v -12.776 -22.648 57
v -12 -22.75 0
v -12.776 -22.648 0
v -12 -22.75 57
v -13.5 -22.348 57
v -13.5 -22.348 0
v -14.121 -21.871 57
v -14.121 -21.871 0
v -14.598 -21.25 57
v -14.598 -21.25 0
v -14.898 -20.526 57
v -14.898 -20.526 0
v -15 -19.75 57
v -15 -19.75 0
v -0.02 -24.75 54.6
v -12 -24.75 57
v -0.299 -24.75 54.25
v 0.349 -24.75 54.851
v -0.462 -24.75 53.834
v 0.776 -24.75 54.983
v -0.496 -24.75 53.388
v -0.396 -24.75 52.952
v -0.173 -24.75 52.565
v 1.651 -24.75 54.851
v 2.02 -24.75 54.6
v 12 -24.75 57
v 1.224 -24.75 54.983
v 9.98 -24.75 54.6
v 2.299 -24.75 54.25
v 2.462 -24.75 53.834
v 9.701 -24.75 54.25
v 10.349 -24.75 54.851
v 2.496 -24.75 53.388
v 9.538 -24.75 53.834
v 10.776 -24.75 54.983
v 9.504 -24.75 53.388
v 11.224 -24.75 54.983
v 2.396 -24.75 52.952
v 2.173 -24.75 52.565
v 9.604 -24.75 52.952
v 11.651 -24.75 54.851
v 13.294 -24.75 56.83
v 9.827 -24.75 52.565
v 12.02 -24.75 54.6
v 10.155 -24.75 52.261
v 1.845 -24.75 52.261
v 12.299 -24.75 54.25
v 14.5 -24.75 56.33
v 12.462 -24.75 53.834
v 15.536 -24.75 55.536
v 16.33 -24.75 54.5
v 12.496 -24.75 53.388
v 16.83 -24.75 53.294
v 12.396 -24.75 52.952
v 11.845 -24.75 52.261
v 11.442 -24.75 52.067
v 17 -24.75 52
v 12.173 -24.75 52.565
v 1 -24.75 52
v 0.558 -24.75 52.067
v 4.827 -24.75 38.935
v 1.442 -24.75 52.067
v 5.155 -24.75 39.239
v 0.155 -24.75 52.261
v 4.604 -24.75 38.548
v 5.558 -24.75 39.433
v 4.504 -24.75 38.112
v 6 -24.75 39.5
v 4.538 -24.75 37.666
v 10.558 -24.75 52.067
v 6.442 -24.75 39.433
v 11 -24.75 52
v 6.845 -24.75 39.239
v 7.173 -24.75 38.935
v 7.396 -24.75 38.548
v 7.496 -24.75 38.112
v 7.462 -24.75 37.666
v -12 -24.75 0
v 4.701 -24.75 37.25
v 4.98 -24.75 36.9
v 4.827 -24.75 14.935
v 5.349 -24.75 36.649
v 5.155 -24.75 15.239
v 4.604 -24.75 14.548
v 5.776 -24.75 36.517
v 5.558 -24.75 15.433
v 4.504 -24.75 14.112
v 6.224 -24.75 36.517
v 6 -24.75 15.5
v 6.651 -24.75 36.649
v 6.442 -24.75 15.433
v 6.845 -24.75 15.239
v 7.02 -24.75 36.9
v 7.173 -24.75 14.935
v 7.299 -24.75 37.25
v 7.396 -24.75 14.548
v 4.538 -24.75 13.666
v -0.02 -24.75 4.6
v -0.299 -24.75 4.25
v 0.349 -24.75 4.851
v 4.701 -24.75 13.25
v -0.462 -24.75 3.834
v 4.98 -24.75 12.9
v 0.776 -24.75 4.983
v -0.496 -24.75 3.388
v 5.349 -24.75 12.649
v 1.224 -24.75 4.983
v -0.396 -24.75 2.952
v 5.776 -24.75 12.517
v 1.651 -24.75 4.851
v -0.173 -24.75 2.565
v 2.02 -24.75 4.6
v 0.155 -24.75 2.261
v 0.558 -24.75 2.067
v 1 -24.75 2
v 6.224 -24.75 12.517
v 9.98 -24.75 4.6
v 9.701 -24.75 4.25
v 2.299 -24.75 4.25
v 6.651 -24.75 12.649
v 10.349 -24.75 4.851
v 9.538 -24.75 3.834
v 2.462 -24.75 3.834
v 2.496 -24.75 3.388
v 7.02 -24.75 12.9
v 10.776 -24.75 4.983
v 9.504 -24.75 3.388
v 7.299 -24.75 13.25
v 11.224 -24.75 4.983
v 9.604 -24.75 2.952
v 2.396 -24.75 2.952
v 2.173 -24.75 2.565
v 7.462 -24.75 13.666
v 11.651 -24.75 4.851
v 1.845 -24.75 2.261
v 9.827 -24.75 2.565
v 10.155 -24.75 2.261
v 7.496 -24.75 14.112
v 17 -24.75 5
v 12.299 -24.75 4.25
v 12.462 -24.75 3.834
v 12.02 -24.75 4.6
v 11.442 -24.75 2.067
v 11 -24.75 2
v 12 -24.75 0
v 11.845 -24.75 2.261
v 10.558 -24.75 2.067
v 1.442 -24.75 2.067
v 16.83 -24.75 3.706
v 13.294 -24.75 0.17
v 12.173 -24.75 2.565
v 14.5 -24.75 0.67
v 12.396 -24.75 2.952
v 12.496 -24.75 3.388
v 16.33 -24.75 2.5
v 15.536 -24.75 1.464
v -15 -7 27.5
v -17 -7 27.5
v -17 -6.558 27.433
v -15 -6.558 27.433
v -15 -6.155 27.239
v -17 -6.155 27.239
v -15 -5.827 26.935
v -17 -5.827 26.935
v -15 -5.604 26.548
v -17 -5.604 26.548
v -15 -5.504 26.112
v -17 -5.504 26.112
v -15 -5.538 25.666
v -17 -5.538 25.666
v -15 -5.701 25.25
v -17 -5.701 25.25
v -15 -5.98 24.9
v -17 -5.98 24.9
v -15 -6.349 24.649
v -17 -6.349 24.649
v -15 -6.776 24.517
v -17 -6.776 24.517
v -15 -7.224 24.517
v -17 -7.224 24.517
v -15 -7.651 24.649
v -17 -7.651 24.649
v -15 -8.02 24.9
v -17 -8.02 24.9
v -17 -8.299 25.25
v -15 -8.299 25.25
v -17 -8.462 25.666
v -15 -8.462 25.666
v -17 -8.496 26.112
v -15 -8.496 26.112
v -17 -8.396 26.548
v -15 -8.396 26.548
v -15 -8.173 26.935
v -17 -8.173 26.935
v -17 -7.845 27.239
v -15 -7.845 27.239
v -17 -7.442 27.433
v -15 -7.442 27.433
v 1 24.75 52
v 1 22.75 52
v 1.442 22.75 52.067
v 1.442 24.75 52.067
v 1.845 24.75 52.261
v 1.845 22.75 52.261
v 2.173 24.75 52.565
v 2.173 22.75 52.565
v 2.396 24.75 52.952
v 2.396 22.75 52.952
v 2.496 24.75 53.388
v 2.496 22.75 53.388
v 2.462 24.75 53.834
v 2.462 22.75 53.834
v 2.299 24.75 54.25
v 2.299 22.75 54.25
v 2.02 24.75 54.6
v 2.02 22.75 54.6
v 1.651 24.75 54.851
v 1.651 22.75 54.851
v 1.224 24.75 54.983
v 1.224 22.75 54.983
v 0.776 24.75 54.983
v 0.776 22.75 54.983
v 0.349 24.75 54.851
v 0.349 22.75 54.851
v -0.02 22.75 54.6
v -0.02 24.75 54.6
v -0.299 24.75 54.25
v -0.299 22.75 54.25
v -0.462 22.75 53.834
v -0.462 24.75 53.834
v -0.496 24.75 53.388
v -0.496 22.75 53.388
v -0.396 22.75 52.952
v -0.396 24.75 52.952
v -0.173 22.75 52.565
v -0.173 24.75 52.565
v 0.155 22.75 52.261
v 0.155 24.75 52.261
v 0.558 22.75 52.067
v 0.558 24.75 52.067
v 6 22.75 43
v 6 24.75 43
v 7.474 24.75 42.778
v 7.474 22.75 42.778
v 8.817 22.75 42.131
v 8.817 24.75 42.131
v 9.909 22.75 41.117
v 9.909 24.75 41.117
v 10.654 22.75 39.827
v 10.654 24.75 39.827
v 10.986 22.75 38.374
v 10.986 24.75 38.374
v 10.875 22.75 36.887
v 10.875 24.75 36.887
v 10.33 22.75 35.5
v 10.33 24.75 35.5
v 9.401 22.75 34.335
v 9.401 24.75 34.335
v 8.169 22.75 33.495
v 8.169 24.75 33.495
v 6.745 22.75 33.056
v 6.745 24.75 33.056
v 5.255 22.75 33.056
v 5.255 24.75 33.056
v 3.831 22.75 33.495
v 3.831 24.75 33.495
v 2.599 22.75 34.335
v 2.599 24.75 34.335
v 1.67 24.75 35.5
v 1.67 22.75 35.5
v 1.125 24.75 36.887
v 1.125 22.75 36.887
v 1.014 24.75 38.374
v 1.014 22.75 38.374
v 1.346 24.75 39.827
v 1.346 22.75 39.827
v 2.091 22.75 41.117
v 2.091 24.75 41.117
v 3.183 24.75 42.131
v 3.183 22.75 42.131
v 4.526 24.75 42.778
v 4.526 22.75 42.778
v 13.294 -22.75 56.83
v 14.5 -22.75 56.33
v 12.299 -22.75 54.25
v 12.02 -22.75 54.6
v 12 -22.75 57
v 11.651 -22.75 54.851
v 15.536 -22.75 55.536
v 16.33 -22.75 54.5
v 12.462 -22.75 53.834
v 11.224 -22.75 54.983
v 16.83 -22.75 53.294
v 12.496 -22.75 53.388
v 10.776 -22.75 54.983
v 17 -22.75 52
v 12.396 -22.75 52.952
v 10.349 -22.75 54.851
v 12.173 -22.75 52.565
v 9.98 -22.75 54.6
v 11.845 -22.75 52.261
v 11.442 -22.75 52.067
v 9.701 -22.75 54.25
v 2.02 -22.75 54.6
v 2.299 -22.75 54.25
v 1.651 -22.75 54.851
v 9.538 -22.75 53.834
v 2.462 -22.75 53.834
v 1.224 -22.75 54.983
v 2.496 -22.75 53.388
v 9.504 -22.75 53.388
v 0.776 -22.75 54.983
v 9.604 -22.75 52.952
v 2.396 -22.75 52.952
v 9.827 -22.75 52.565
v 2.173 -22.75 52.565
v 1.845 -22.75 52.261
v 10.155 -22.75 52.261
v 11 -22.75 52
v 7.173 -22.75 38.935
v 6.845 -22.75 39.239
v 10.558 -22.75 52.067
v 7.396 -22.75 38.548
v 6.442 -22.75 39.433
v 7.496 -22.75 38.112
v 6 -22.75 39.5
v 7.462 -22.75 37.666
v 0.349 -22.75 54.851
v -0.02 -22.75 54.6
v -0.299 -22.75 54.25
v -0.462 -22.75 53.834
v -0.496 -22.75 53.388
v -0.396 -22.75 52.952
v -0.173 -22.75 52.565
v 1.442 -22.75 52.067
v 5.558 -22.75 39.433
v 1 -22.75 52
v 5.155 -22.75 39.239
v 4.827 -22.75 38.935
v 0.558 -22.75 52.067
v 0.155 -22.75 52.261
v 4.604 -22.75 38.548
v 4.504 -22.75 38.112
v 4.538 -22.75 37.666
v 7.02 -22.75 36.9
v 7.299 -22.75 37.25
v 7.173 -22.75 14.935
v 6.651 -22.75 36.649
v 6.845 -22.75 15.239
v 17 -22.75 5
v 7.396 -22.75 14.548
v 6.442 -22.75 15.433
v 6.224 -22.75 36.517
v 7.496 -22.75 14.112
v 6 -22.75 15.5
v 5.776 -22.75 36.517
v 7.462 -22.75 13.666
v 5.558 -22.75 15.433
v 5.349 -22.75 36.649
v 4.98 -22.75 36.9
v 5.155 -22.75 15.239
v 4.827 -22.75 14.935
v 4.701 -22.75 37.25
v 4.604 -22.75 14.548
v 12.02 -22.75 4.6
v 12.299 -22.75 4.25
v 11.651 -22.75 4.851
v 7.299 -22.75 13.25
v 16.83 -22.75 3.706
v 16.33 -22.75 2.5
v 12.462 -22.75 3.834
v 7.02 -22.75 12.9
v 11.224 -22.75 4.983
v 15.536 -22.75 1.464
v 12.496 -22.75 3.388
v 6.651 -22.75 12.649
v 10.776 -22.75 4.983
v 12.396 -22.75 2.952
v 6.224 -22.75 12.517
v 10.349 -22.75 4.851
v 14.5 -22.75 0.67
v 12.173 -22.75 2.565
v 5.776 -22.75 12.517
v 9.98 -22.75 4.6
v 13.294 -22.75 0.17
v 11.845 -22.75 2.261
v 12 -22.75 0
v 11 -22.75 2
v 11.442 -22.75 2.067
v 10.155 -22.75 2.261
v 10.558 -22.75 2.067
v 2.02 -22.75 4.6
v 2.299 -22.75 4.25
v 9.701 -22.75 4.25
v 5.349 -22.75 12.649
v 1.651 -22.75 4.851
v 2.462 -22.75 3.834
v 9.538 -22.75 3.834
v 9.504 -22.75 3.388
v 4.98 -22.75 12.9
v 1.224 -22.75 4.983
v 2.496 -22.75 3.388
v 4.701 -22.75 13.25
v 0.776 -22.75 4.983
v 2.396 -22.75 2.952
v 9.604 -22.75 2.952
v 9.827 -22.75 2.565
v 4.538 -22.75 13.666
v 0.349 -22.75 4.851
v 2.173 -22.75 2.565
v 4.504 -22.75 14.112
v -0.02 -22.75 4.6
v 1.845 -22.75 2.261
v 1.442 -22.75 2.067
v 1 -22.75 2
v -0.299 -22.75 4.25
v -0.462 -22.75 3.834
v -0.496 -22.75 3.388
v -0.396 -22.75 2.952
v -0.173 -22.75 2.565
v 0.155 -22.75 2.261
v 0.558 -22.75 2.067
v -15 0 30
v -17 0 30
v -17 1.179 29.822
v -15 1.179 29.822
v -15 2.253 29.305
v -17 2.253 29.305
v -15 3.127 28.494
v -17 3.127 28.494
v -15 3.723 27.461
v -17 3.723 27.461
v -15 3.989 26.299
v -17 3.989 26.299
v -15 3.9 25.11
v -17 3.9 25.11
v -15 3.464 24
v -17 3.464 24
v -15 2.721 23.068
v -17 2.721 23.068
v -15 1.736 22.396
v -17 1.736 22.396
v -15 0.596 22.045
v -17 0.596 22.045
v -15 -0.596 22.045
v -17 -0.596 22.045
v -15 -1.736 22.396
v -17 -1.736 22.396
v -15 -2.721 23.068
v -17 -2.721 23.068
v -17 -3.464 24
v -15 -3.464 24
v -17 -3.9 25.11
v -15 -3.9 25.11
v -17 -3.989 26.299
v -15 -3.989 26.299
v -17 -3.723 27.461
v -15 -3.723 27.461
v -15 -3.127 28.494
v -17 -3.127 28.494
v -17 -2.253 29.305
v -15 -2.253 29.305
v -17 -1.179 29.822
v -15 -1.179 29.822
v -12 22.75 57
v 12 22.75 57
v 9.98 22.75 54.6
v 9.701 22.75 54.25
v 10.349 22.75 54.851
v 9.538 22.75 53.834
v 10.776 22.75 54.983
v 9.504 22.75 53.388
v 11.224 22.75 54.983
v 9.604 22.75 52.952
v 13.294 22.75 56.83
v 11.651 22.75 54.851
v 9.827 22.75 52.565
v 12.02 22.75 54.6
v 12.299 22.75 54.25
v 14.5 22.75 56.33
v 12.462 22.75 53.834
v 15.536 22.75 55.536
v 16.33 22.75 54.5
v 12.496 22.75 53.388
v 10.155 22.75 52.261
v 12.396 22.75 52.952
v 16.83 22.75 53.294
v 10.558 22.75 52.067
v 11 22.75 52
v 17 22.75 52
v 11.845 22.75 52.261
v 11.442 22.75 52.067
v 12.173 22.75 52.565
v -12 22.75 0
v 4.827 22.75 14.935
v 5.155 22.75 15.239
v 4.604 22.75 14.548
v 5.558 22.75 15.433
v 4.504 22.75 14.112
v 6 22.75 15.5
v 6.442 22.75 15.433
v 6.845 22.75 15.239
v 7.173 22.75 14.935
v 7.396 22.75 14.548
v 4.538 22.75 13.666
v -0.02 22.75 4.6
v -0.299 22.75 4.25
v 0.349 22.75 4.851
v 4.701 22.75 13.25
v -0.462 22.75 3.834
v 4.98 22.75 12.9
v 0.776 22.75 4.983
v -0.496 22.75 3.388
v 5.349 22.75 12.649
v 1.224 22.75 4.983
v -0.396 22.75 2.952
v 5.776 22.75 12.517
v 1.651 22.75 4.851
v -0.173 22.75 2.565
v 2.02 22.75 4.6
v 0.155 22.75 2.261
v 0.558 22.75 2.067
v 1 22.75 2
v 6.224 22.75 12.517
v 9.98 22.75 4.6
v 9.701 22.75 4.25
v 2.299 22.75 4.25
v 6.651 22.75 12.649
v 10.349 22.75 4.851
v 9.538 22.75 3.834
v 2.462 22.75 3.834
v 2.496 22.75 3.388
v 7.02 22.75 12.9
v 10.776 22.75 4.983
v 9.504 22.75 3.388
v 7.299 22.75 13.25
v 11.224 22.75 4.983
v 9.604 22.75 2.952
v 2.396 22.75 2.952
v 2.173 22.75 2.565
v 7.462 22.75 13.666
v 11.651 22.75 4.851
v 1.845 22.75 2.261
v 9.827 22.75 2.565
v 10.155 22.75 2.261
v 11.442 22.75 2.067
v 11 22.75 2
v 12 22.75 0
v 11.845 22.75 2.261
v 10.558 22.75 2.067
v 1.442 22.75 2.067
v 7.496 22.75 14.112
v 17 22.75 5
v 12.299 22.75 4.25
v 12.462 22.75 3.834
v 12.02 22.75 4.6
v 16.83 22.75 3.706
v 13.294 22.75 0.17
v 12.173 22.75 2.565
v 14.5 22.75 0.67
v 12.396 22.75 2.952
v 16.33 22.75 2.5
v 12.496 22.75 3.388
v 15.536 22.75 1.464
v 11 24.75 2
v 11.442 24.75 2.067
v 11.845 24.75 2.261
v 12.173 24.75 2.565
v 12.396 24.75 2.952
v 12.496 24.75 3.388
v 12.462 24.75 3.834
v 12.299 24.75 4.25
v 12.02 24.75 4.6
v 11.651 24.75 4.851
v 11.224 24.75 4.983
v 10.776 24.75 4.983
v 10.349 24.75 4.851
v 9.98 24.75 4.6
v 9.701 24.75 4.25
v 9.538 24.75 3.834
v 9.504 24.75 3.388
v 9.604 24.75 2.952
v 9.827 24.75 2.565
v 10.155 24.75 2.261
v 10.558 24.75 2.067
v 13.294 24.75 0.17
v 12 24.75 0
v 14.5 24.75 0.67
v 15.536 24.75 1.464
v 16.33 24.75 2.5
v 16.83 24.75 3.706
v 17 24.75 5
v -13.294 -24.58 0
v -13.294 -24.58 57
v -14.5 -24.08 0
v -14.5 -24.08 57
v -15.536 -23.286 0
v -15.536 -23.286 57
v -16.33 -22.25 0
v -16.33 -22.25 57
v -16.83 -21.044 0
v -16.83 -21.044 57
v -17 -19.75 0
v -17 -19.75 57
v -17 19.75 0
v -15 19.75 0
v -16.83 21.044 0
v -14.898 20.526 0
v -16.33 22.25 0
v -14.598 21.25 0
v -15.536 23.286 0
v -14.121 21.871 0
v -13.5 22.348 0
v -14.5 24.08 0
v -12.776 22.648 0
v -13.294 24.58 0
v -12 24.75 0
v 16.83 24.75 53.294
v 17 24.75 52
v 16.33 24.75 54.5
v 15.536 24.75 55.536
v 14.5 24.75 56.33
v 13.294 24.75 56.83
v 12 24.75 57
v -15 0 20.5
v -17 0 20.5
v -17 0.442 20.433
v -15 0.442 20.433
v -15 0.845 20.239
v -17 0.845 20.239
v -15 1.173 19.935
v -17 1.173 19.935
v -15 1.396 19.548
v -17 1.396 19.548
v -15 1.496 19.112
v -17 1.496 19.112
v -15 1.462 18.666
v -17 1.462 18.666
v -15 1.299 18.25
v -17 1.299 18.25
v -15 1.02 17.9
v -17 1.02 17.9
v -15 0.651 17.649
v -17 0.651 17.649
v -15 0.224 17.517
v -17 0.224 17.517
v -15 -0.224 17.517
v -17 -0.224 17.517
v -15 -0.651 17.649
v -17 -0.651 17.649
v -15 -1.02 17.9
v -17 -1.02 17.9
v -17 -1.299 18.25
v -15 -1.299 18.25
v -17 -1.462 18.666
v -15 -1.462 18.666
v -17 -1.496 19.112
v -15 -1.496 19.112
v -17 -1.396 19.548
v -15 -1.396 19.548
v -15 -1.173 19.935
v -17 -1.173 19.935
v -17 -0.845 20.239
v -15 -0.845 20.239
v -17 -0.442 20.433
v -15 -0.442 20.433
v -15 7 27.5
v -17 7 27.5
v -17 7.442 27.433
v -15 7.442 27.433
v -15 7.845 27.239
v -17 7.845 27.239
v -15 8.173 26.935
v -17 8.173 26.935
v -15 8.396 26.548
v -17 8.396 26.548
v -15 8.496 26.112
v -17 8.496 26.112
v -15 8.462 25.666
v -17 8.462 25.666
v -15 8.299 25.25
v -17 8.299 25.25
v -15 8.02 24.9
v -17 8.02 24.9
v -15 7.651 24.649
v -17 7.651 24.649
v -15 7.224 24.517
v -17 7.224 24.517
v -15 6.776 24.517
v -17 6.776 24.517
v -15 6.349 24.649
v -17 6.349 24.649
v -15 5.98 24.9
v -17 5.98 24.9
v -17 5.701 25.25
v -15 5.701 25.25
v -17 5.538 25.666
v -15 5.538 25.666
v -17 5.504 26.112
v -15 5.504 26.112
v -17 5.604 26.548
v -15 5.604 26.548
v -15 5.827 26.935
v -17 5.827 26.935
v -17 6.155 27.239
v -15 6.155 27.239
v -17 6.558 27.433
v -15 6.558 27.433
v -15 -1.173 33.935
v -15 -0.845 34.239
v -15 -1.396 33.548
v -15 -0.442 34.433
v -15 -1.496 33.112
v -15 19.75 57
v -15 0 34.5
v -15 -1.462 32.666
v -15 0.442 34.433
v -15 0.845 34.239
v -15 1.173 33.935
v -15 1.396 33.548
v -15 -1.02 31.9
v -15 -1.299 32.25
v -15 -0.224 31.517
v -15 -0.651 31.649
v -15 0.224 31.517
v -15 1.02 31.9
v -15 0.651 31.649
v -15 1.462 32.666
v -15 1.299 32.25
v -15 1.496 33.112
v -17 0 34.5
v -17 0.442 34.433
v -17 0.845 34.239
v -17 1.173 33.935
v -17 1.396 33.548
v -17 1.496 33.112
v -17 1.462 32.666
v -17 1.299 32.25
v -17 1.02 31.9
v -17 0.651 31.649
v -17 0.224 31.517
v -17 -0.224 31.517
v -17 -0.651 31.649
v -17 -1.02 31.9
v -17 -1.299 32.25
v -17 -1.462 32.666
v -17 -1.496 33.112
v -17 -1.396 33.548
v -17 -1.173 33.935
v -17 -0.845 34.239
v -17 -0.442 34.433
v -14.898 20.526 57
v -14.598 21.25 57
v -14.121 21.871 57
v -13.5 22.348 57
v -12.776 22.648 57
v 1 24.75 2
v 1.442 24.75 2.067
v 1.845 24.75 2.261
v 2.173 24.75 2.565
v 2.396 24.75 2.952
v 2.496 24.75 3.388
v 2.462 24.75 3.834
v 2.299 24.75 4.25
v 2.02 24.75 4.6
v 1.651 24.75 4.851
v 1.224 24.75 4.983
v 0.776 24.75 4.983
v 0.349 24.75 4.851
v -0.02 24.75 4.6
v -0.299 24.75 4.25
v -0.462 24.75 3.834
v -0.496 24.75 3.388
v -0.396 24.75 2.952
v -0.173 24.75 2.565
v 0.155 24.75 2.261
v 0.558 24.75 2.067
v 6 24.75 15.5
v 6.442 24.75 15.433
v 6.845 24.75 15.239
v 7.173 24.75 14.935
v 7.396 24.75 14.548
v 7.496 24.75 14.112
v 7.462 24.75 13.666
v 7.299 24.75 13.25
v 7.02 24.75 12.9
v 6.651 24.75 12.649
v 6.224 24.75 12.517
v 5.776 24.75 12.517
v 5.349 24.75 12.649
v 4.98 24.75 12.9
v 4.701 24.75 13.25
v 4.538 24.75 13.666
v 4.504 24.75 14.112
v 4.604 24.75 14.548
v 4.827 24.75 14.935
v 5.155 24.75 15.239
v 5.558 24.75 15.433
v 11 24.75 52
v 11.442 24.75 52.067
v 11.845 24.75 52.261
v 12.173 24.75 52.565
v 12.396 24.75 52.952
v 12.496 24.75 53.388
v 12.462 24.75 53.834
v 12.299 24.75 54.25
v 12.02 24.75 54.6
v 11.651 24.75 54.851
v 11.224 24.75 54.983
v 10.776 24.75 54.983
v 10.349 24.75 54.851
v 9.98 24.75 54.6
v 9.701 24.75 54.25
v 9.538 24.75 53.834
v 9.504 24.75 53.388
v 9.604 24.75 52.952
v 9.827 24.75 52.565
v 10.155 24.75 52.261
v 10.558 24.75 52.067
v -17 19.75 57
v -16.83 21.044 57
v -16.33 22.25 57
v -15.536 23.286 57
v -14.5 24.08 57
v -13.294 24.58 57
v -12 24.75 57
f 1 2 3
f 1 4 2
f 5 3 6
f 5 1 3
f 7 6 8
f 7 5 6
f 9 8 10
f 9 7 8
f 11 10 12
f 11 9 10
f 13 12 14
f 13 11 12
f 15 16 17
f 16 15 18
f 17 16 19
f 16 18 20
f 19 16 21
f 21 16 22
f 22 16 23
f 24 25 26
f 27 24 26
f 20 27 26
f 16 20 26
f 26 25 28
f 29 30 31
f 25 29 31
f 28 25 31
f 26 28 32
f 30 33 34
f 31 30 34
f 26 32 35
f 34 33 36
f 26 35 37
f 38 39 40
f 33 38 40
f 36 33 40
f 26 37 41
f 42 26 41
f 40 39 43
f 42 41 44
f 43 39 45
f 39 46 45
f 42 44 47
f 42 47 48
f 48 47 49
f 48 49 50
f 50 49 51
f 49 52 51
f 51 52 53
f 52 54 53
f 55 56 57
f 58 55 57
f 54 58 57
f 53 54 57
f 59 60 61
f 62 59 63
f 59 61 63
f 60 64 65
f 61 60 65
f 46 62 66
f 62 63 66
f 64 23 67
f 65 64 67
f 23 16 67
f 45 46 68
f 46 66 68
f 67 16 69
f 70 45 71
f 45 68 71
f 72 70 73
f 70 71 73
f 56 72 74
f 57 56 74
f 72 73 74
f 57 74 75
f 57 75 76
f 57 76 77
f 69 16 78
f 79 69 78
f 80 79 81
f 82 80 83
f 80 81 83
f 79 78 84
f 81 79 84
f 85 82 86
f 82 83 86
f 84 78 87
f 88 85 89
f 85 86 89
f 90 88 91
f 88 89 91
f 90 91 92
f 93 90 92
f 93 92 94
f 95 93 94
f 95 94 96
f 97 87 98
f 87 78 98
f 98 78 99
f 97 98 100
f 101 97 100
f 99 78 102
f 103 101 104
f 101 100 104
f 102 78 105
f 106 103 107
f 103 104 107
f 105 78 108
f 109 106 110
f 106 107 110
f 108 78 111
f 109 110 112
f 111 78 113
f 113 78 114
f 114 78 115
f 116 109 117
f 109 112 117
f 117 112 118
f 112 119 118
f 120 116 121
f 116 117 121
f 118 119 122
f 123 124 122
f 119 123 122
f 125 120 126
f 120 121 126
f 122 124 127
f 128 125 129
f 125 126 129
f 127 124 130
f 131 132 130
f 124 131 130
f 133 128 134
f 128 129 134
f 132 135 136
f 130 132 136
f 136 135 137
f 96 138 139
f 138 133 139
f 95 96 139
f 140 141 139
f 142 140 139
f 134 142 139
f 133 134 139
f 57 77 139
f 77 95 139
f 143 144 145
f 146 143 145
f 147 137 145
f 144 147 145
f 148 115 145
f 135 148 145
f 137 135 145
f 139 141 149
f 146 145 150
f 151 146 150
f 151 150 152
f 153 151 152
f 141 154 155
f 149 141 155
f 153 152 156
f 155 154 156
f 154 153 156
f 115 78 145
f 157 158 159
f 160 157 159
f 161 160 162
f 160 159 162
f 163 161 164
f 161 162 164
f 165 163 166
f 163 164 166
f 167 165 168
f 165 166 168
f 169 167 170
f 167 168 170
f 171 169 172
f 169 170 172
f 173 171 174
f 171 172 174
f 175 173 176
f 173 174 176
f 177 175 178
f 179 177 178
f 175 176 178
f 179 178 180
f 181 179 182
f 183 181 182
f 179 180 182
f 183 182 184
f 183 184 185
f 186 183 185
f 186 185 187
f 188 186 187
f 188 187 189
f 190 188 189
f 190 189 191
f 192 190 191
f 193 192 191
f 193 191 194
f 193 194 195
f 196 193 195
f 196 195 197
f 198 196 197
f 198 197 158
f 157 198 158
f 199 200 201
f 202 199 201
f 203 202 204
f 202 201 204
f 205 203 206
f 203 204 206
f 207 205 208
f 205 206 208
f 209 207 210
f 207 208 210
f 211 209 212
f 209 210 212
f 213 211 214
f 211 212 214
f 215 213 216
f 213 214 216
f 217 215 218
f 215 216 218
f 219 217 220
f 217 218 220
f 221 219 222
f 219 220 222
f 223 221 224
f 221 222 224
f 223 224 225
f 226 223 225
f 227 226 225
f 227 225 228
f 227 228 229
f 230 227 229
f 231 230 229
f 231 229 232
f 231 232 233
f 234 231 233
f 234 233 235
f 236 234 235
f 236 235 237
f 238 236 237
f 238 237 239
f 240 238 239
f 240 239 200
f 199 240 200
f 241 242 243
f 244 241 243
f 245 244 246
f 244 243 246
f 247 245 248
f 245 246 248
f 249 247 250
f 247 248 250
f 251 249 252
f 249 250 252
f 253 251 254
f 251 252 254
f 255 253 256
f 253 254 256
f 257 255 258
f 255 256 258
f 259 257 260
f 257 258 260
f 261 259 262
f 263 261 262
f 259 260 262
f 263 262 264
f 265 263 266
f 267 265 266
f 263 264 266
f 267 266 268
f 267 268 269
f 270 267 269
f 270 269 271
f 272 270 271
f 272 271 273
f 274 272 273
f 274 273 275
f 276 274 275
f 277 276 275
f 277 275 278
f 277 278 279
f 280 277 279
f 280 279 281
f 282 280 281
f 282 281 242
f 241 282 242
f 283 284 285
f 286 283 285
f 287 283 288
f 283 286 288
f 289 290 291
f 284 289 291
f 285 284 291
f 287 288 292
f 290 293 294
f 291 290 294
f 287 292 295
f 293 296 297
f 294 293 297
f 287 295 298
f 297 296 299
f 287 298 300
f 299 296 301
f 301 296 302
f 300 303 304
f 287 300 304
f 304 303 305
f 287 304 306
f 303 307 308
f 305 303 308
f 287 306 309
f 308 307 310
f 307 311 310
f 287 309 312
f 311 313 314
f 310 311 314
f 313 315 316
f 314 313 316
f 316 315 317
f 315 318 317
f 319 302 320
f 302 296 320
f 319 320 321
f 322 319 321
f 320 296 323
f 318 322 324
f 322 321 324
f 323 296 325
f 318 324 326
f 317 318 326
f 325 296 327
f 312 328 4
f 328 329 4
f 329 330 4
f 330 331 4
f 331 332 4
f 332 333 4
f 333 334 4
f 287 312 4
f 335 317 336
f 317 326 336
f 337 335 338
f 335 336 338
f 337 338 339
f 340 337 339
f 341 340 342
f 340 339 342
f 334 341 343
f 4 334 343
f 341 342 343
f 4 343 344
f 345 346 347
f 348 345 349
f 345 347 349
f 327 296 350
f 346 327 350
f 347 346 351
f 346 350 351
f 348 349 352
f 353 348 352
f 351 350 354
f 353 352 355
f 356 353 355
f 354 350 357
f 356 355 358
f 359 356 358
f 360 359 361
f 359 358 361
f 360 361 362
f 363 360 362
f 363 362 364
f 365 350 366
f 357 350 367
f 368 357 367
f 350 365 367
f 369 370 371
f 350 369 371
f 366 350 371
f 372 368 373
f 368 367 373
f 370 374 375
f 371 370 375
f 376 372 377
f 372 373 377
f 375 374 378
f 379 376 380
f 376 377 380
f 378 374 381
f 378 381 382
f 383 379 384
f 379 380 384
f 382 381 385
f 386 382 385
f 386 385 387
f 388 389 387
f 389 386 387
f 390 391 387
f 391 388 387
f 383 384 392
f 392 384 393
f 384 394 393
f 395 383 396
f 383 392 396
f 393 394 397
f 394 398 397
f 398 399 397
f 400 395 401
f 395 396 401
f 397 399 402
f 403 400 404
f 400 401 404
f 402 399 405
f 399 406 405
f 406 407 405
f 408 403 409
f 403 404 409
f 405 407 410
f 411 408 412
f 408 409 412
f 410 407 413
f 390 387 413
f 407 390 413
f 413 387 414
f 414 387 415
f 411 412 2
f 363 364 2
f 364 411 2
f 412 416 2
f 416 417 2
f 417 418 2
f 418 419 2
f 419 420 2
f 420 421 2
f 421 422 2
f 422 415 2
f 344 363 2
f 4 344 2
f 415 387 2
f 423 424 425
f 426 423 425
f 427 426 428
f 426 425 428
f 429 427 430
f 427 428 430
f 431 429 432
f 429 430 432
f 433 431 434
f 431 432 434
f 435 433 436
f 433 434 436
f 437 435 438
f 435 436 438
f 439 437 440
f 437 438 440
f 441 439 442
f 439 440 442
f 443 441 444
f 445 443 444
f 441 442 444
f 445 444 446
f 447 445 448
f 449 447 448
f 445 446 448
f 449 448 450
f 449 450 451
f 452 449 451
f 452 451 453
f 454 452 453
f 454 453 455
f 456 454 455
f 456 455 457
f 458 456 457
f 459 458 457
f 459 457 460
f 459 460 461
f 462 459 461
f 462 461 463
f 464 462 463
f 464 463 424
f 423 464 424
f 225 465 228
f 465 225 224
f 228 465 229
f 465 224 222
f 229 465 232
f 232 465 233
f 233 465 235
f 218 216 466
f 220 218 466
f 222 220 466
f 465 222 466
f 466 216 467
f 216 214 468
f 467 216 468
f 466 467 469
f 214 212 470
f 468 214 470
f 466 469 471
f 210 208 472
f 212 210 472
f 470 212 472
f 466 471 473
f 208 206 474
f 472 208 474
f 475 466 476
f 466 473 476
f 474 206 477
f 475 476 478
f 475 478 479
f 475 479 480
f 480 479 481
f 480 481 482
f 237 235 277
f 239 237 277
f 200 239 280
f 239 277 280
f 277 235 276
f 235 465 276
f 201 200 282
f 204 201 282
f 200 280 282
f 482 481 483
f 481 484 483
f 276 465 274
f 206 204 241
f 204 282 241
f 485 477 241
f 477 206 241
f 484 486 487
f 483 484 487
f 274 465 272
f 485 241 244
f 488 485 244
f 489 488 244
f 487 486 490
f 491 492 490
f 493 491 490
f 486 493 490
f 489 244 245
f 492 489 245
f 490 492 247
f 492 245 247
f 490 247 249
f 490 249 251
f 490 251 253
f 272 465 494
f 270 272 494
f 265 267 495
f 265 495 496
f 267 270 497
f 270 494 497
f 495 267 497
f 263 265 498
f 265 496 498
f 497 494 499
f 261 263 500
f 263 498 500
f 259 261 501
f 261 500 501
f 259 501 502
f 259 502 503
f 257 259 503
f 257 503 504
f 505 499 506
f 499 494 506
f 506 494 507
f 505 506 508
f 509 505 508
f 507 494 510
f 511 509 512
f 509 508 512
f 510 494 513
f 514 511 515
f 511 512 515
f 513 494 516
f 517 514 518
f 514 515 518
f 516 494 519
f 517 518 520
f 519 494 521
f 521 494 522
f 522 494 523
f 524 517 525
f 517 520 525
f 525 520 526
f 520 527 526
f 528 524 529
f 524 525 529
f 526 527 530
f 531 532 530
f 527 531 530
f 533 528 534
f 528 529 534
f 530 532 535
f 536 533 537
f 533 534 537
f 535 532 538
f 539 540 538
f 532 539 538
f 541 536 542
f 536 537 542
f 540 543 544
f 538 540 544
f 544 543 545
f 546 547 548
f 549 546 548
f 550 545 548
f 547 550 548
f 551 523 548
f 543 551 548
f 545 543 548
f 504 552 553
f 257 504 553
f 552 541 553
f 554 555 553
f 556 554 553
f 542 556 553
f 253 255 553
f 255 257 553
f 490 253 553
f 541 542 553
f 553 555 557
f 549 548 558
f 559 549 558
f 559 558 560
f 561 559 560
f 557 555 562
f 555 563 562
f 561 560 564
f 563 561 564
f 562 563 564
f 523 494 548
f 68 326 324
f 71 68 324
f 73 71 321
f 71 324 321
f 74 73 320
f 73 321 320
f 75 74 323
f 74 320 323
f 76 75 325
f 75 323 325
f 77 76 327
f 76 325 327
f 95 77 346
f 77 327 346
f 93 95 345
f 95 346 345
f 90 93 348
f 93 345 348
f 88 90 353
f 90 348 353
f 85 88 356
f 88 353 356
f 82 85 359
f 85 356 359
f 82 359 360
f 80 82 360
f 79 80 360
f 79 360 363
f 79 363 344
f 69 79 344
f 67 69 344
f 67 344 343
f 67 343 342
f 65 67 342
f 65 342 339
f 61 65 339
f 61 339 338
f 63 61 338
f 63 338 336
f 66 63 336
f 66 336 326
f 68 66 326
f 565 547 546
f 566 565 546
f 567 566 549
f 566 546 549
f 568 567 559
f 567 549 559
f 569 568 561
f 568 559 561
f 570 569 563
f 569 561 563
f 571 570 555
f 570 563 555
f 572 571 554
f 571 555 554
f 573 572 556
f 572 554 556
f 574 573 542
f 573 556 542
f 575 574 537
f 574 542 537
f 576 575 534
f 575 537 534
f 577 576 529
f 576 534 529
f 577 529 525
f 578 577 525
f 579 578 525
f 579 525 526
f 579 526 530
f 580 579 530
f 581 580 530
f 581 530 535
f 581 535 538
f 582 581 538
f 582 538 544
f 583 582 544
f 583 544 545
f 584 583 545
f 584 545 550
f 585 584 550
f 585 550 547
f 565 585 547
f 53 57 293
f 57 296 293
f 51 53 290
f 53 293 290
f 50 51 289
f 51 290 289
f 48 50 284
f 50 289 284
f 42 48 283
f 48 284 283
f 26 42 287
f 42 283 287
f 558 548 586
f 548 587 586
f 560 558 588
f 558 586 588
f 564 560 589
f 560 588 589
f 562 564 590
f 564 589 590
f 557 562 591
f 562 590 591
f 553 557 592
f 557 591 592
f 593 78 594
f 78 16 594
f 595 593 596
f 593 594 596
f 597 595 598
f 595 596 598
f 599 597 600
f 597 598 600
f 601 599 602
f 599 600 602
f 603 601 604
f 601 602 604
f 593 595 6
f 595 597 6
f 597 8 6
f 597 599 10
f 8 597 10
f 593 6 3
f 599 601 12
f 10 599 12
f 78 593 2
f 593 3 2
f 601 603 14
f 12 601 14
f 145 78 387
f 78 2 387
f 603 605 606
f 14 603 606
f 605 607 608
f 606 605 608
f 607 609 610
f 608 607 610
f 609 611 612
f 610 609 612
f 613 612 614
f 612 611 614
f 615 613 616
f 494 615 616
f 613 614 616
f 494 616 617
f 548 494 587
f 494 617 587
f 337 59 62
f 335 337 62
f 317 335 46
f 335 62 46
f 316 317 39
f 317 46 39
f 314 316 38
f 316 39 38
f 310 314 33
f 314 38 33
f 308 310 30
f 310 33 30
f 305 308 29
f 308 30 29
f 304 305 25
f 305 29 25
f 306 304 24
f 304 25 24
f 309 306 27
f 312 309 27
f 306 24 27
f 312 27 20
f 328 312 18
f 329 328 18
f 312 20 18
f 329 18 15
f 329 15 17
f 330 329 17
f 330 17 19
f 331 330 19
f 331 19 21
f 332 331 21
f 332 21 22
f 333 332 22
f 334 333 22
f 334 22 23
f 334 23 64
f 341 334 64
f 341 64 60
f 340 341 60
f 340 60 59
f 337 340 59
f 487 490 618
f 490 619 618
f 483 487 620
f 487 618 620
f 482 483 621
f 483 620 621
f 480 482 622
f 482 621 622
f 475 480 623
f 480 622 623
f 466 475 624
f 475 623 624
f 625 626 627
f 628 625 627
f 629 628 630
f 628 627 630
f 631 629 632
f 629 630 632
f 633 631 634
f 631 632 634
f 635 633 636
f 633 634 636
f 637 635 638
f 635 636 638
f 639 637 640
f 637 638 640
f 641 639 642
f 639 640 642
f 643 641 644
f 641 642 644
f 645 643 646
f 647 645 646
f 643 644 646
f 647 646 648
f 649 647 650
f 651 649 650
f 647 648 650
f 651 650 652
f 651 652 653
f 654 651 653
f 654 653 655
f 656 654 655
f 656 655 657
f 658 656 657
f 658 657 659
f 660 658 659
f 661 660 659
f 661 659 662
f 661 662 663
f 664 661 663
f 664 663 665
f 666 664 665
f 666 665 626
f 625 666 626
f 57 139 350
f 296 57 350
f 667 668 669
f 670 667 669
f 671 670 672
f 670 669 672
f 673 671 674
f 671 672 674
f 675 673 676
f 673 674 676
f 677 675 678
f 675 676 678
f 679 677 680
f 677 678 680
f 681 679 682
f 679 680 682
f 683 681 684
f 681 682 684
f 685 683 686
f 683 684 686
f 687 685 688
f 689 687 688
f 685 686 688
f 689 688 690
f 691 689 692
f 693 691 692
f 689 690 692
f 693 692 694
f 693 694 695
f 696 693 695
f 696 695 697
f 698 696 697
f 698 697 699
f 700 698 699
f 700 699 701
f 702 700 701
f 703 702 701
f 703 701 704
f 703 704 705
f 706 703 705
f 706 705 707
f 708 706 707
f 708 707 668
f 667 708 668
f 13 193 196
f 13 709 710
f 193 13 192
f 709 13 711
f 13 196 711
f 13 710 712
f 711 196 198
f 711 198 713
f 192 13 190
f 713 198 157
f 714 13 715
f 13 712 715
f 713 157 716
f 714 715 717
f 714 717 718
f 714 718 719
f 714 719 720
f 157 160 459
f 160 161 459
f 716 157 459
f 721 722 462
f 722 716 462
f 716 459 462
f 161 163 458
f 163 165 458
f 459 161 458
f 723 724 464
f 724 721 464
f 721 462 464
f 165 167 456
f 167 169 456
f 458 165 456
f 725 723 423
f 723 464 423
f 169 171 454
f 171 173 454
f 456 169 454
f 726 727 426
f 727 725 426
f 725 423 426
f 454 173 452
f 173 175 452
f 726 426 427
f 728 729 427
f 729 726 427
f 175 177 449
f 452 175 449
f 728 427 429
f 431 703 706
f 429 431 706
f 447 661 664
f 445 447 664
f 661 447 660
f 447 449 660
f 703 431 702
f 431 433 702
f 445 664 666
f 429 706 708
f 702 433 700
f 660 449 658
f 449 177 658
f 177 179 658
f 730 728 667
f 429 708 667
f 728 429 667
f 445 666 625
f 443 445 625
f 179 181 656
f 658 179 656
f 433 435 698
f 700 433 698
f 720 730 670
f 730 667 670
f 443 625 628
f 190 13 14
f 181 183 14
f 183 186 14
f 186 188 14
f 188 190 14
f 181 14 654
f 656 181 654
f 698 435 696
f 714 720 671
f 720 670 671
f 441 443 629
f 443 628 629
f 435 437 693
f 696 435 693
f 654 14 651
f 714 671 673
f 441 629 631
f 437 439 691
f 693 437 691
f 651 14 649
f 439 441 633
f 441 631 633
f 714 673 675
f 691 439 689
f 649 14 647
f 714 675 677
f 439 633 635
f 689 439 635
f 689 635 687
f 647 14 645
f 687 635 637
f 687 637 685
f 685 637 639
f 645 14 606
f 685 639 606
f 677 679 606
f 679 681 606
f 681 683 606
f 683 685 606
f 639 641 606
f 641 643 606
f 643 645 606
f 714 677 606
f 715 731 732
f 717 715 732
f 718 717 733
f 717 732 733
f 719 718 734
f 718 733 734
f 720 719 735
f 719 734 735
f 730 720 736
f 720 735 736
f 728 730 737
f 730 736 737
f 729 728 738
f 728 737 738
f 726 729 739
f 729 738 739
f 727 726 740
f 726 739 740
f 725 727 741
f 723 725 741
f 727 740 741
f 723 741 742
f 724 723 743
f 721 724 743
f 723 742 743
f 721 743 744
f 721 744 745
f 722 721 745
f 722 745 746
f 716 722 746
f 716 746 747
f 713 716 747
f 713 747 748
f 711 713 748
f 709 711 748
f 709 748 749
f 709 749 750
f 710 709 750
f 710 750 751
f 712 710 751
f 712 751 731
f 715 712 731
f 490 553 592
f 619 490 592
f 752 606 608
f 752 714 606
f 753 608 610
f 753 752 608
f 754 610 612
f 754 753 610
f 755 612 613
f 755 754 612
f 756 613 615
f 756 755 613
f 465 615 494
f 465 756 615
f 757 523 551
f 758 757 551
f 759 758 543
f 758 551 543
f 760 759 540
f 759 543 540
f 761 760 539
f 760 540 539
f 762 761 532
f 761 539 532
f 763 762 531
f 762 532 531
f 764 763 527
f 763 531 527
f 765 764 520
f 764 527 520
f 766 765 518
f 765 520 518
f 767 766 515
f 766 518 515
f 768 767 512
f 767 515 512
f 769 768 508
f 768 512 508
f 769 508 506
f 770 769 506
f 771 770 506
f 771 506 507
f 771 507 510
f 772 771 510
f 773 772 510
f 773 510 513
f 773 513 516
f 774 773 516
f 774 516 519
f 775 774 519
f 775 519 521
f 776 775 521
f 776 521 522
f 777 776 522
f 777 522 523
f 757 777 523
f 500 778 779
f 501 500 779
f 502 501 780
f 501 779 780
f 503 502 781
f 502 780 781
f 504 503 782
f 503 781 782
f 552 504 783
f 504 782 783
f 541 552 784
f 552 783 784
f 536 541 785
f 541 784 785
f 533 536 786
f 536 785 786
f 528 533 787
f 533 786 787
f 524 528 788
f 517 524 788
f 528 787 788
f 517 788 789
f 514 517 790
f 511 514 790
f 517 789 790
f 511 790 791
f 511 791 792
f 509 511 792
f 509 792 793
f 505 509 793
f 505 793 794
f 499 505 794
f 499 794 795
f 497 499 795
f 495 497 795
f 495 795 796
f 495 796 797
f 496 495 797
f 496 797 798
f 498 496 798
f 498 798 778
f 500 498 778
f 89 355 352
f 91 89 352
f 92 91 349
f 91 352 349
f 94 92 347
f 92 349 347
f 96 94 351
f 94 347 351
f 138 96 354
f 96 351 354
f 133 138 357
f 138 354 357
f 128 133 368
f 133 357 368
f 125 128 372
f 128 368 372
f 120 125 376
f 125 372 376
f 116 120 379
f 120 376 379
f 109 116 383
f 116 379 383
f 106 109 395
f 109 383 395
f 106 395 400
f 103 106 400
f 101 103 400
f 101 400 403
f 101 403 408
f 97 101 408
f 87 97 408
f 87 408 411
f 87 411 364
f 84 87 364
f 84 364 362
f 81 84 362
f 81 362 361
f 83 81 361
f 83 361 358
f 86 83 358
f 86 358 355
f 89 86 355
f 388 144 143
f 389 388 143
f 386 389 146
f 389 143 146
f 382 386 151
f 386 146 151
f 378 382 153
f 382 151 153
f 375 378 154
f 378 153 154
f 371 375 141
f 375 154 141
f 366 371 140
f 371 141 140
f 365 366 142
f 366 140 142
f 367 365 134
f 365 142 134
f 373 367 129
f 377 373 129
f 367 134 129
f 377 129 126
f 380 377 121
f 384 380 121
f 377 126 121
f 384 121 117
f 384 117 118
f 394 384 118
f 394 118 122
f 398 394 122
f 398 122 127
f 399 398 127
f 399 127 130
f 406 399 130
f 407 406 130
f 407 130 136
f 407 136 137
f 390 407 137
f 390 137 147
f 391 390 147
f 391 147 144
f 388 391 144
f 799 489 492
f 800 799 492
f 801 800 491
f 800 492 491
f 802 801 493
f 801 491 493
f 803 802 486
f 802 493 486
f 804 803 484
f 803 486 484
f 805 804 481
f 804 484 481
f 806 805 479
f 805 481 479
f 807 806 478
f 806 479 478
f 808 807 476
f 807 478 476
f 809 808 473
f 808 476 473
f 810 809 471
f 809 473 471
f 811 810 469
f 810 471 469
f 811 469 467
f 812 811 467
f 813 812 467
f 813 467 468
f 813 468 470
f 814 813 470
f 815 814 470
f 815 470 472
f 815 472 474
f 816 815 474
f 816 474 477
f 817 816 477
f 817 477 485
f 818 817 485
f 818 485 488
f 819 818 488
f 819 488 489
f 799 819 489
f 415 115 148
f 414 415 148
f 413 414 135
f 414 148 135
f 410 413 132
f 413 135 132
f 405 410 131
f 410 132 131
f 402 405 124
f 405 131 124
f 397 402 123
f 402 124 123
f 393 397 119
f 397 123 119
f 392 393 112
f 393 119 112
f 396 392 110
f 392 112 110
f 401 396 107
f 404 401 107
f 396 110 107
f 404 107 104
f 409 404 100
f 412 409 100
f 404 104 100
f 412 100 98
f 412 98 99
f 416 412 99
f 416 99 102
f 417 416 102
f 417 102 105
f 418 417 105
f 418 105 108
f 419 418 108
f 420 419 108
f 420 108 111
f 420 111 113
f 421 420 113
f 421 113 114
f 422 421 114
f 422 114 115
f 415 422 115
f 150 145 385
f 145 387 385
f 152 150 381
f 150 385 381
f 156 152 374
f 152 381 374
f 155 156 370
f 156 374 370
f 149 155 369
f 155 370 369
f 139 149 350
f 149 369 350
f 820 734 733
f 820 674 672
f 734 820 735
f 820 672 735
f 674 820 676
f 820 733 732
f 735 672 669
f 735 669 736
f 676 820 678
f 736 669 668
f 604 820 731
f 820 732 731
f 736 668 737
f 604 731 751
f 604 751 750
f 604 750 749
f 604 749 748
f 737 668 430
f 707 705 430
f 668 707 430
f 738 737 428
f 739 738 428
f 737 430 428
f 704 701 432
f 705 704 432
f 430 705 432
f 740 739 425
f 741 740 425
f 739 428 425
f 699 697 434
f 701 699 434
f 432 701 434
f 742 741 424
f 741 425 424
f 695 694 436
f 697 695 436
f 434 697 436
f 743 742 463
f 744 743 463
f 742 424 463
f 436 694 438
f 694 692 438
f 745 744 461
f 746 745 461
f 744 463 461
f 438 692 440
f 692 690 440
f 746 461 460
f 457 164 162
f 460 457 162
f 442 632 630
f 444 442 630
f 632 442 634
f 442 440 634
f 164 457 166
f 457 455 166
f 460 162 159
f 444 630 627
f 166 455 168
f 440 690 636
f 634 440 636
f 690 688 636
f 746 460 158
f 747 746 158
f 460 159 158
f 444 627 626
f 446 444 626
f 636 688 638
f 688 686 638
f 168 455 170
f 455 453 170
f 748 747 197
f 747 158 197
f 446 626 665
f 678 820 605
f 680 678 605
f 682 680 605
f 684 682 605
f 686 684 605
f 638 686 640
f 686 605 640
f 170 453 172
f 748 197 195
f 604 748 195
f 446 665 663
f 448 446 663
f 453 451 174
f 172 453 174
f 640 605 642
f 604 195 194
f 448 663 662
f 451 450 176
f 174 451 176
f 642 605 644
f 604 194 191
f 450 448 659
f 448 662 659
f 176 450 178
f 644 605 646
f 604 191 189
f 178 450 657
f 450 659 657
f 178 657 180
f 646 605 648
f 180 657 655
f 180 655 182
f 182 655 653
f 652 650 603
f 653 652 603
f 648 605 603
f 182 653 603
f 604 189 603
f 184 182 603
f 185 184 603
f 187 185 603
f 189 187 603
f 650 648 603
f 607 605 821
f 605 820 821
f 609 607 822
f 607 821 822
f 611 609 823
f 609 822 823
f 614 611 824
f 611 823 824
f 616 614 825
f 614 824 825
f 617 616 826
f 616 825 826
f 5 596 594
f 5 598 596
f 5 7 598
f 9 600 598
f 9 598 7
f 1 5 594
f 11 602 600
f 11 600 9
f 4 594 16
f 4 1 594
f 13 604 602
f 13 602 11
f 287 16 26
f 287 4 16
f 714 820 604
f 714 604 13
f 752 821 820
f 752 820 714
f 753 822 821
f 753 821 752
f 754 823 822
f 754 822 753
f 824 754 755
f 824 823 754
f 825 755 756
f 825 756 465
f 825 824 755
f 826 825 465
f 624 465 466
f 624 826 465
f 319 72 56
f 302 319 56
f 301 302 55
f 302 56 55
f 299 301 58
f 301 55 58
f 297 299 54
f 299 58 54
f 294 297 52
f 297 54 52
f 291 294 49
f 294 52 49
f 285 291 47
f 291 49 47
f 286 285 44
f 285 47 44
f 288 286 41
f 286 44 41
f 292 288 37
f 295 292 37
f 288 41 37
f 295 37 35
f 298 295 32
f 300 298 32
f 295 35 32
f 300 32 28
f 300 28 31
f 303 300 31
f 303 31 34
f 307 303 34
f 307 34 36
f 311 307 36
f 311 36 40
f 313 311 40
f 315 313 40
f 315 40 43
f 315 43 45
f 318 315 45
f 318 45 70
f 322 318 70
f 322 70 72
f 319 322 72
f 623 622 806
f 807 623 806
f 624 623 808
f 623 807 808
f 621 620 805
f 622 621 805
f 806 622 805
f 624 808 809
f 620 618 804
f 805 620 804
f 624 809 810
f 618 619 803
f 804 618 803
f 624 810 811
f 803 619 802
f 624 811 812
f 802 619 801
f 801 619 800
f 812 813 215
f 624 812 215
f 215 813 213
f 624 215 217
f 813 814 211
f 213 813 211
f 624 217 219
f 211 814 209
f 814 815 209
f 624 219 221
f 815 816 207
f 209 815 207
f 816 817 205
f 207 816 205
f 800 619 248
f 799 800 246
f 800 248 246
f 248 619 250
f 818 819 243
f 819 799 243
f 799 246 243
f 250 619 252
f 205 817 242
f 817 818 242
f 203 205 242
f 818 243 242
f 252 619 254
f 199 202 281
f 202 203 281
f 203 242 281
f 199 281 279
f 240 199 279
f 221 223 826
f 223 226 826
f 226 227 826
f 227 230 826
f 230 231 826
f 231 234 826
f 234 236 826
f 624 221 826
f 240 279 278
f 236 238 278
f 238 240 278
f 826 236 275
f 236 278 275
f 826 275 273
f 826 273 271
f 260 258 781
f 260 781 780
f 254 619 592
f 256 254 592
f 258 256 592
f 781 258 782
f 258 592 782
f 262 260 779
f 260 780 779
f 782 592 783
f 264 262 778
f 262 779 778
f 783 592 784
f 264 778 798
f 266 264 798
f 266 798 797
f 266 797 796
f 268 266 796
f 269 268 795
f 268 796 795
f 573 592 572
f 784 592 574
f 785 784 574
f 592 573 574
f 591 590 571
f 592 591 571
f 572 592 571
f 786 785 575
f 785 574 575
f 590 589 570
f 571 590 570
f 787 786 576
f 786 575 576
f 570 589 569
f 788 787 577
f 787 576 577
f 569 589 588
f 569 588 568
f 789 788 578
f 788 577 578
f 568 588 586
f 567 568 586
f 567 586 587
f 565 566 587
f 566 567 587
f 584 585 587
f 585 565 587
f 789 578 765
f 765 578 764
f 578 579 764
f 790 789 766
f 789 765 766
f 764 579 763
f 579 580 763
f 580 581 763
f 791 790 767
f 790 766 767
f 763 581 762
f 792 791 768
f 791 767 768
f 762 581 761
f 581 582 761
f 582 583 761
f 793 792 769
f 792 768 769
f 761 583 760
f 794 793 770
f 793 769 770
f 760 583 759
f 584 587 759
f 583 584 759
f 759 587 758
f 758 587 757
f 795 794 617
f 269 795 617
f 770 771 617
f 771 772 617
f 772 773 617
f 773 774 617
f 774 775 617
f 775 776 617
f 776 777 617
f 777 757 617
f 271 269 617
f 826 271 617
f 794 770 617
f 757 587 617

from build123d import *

# Parameters (mm, degrees)
EXTRUDE_1_DEPTH     = 57
SKETCH_2_R          = 1.5
CUT_EXTRUDE_1_DEPTH = 57
SKETCH_4_R          = 4
SKETCH_4_R_2        = 1.5
CUT_EXTRUDE_2_DEPTH = 57
FILLET_1_R          = 5
FILLET_2_R          = 3
FILLET_3_R          = 5
SKETCH_5_R          = 5
CUT_EXTRUDE_3_DEPTH = 26
SKETCH_6_R          = 1.5
CUT_EXTRUDE_4_DEPTH = 71


with BuildPart() as part:
    # 草图1 → 凸台-拉伸1 (new body)
    with BuildSketch(Plane.XY):
        Polygon((-17, -24.75), (17, -24.75), (17, -22.75), (-15, -22.75), (-15, 22.75), (17, 22.75), (17, 24.75), (-17, 24.75), align=None)
    extrude(amount=EXTRUDE_1_DEPTH)

    # 草图2 → 切除-拉伸1 (cut)
    with BuildSketch(Plane(origin=(0, 24.75, 0), x_dir=(1, 0, 0), z_dir=(0, 1, 0))):
        with Locations(Location((6, -14, 0), (0, 0, 270))):
            Circle(SKETCH_2_R)
        with Locations(Location((6, -38, 0), (0, 0, 270))):
            Circle(SKETCH_2_R)
    extrude(amount=-CUT_EXTRUDE_1_DEPTH, mode=Mode.SUBTRACT)

    # 草图4 → 切除-拉伸2 (cut)
    with BuildSketch(Plane.ZY.offset(17)):
        with Locations((26, 0)):
            Circle(SKETCH_4_R)
        with Locations((26, 7)):
            Circle(SKETCH_4_R_2)
        with Locations((33, 0)):
            Circle(SKETCH_4_R_2)
        with Locations((26, -7)):
            Circle(SKETCH_4_R_2)
        with Locations((19, 0)):
            Circle(SKETCH_4_R_2)
    extrude(amount=-CUT_EXTRUDE_2_DEPTH, mode=Mode.SUBTRACT)

    # 圆角1
    fillet_1_edges = [part.edges().sort_by_distance(p)[0] for p in [
        (-17, -24.75, 28.5),
        (-17, 24.75, 28.5),
    ]]
    fillet(fillet_1_edges, radius=FILLET_1_R)

    # 圆角2
    fillet_2_edges = [part.edges().sort_by_distance(p)[0] for p in [
        (-15, 22.75, 28.5),
        (-15, -22.75, 28.5),
    ]]
    fillet(fillet_2_edges, radius=FILLET_2_R)

    # 圆角3
    fillet_3_edges = [part.edges().sort_by_distance(p)[0] for p in [
        (17, 23.75, 0),
        (17, -23.75, 57),
        (17, 23.75, 57),
        (17, -23.75, 0),
    ]]
    fillet(fillet_3_edges, radius=FILLET_3_R)

    # 草图5 → 切除-拉伸3 (cut)
    with BuildSketch(Plane(origin=(0, 24.75, 0), x_dir=(1, 0, 0), z_dir=(0, 1, 0))):
        with Locations(Location((6, -38, 0), (0, 0, 270))):
            Circle(SKETCH_5_R)
    extrude(amount=-CUT_EXTRUDE_3_DEPTH, mode=Mode.SUBTRACT)

    # 草图6 → 切除-拉伸4 (cut)
    with BuildSketch(Plane.XZ.offset(24.75)):
        with Locations(Location((1, 53.5, 0), (0, 0, 270))):
            Circle(SKETCH_6_R)
        with Locations(Location((11, 53.5, 0), (0, 0, 270))):
            Circle(SKETCH_6_R)
        with Locations(Location((11, 3.5, 0), (0, 0, 270))):
            Circle(SKETCH_6_R)
        with Locations(Location((1, 3.5, 0), (0, 0, 270))):
            Circle(SKETCH_6_R)
    extrude(amount=-CUT_EXTRUDE_4_DEPTH, mode=Mode.SUBTRACT)


solid = part.part
